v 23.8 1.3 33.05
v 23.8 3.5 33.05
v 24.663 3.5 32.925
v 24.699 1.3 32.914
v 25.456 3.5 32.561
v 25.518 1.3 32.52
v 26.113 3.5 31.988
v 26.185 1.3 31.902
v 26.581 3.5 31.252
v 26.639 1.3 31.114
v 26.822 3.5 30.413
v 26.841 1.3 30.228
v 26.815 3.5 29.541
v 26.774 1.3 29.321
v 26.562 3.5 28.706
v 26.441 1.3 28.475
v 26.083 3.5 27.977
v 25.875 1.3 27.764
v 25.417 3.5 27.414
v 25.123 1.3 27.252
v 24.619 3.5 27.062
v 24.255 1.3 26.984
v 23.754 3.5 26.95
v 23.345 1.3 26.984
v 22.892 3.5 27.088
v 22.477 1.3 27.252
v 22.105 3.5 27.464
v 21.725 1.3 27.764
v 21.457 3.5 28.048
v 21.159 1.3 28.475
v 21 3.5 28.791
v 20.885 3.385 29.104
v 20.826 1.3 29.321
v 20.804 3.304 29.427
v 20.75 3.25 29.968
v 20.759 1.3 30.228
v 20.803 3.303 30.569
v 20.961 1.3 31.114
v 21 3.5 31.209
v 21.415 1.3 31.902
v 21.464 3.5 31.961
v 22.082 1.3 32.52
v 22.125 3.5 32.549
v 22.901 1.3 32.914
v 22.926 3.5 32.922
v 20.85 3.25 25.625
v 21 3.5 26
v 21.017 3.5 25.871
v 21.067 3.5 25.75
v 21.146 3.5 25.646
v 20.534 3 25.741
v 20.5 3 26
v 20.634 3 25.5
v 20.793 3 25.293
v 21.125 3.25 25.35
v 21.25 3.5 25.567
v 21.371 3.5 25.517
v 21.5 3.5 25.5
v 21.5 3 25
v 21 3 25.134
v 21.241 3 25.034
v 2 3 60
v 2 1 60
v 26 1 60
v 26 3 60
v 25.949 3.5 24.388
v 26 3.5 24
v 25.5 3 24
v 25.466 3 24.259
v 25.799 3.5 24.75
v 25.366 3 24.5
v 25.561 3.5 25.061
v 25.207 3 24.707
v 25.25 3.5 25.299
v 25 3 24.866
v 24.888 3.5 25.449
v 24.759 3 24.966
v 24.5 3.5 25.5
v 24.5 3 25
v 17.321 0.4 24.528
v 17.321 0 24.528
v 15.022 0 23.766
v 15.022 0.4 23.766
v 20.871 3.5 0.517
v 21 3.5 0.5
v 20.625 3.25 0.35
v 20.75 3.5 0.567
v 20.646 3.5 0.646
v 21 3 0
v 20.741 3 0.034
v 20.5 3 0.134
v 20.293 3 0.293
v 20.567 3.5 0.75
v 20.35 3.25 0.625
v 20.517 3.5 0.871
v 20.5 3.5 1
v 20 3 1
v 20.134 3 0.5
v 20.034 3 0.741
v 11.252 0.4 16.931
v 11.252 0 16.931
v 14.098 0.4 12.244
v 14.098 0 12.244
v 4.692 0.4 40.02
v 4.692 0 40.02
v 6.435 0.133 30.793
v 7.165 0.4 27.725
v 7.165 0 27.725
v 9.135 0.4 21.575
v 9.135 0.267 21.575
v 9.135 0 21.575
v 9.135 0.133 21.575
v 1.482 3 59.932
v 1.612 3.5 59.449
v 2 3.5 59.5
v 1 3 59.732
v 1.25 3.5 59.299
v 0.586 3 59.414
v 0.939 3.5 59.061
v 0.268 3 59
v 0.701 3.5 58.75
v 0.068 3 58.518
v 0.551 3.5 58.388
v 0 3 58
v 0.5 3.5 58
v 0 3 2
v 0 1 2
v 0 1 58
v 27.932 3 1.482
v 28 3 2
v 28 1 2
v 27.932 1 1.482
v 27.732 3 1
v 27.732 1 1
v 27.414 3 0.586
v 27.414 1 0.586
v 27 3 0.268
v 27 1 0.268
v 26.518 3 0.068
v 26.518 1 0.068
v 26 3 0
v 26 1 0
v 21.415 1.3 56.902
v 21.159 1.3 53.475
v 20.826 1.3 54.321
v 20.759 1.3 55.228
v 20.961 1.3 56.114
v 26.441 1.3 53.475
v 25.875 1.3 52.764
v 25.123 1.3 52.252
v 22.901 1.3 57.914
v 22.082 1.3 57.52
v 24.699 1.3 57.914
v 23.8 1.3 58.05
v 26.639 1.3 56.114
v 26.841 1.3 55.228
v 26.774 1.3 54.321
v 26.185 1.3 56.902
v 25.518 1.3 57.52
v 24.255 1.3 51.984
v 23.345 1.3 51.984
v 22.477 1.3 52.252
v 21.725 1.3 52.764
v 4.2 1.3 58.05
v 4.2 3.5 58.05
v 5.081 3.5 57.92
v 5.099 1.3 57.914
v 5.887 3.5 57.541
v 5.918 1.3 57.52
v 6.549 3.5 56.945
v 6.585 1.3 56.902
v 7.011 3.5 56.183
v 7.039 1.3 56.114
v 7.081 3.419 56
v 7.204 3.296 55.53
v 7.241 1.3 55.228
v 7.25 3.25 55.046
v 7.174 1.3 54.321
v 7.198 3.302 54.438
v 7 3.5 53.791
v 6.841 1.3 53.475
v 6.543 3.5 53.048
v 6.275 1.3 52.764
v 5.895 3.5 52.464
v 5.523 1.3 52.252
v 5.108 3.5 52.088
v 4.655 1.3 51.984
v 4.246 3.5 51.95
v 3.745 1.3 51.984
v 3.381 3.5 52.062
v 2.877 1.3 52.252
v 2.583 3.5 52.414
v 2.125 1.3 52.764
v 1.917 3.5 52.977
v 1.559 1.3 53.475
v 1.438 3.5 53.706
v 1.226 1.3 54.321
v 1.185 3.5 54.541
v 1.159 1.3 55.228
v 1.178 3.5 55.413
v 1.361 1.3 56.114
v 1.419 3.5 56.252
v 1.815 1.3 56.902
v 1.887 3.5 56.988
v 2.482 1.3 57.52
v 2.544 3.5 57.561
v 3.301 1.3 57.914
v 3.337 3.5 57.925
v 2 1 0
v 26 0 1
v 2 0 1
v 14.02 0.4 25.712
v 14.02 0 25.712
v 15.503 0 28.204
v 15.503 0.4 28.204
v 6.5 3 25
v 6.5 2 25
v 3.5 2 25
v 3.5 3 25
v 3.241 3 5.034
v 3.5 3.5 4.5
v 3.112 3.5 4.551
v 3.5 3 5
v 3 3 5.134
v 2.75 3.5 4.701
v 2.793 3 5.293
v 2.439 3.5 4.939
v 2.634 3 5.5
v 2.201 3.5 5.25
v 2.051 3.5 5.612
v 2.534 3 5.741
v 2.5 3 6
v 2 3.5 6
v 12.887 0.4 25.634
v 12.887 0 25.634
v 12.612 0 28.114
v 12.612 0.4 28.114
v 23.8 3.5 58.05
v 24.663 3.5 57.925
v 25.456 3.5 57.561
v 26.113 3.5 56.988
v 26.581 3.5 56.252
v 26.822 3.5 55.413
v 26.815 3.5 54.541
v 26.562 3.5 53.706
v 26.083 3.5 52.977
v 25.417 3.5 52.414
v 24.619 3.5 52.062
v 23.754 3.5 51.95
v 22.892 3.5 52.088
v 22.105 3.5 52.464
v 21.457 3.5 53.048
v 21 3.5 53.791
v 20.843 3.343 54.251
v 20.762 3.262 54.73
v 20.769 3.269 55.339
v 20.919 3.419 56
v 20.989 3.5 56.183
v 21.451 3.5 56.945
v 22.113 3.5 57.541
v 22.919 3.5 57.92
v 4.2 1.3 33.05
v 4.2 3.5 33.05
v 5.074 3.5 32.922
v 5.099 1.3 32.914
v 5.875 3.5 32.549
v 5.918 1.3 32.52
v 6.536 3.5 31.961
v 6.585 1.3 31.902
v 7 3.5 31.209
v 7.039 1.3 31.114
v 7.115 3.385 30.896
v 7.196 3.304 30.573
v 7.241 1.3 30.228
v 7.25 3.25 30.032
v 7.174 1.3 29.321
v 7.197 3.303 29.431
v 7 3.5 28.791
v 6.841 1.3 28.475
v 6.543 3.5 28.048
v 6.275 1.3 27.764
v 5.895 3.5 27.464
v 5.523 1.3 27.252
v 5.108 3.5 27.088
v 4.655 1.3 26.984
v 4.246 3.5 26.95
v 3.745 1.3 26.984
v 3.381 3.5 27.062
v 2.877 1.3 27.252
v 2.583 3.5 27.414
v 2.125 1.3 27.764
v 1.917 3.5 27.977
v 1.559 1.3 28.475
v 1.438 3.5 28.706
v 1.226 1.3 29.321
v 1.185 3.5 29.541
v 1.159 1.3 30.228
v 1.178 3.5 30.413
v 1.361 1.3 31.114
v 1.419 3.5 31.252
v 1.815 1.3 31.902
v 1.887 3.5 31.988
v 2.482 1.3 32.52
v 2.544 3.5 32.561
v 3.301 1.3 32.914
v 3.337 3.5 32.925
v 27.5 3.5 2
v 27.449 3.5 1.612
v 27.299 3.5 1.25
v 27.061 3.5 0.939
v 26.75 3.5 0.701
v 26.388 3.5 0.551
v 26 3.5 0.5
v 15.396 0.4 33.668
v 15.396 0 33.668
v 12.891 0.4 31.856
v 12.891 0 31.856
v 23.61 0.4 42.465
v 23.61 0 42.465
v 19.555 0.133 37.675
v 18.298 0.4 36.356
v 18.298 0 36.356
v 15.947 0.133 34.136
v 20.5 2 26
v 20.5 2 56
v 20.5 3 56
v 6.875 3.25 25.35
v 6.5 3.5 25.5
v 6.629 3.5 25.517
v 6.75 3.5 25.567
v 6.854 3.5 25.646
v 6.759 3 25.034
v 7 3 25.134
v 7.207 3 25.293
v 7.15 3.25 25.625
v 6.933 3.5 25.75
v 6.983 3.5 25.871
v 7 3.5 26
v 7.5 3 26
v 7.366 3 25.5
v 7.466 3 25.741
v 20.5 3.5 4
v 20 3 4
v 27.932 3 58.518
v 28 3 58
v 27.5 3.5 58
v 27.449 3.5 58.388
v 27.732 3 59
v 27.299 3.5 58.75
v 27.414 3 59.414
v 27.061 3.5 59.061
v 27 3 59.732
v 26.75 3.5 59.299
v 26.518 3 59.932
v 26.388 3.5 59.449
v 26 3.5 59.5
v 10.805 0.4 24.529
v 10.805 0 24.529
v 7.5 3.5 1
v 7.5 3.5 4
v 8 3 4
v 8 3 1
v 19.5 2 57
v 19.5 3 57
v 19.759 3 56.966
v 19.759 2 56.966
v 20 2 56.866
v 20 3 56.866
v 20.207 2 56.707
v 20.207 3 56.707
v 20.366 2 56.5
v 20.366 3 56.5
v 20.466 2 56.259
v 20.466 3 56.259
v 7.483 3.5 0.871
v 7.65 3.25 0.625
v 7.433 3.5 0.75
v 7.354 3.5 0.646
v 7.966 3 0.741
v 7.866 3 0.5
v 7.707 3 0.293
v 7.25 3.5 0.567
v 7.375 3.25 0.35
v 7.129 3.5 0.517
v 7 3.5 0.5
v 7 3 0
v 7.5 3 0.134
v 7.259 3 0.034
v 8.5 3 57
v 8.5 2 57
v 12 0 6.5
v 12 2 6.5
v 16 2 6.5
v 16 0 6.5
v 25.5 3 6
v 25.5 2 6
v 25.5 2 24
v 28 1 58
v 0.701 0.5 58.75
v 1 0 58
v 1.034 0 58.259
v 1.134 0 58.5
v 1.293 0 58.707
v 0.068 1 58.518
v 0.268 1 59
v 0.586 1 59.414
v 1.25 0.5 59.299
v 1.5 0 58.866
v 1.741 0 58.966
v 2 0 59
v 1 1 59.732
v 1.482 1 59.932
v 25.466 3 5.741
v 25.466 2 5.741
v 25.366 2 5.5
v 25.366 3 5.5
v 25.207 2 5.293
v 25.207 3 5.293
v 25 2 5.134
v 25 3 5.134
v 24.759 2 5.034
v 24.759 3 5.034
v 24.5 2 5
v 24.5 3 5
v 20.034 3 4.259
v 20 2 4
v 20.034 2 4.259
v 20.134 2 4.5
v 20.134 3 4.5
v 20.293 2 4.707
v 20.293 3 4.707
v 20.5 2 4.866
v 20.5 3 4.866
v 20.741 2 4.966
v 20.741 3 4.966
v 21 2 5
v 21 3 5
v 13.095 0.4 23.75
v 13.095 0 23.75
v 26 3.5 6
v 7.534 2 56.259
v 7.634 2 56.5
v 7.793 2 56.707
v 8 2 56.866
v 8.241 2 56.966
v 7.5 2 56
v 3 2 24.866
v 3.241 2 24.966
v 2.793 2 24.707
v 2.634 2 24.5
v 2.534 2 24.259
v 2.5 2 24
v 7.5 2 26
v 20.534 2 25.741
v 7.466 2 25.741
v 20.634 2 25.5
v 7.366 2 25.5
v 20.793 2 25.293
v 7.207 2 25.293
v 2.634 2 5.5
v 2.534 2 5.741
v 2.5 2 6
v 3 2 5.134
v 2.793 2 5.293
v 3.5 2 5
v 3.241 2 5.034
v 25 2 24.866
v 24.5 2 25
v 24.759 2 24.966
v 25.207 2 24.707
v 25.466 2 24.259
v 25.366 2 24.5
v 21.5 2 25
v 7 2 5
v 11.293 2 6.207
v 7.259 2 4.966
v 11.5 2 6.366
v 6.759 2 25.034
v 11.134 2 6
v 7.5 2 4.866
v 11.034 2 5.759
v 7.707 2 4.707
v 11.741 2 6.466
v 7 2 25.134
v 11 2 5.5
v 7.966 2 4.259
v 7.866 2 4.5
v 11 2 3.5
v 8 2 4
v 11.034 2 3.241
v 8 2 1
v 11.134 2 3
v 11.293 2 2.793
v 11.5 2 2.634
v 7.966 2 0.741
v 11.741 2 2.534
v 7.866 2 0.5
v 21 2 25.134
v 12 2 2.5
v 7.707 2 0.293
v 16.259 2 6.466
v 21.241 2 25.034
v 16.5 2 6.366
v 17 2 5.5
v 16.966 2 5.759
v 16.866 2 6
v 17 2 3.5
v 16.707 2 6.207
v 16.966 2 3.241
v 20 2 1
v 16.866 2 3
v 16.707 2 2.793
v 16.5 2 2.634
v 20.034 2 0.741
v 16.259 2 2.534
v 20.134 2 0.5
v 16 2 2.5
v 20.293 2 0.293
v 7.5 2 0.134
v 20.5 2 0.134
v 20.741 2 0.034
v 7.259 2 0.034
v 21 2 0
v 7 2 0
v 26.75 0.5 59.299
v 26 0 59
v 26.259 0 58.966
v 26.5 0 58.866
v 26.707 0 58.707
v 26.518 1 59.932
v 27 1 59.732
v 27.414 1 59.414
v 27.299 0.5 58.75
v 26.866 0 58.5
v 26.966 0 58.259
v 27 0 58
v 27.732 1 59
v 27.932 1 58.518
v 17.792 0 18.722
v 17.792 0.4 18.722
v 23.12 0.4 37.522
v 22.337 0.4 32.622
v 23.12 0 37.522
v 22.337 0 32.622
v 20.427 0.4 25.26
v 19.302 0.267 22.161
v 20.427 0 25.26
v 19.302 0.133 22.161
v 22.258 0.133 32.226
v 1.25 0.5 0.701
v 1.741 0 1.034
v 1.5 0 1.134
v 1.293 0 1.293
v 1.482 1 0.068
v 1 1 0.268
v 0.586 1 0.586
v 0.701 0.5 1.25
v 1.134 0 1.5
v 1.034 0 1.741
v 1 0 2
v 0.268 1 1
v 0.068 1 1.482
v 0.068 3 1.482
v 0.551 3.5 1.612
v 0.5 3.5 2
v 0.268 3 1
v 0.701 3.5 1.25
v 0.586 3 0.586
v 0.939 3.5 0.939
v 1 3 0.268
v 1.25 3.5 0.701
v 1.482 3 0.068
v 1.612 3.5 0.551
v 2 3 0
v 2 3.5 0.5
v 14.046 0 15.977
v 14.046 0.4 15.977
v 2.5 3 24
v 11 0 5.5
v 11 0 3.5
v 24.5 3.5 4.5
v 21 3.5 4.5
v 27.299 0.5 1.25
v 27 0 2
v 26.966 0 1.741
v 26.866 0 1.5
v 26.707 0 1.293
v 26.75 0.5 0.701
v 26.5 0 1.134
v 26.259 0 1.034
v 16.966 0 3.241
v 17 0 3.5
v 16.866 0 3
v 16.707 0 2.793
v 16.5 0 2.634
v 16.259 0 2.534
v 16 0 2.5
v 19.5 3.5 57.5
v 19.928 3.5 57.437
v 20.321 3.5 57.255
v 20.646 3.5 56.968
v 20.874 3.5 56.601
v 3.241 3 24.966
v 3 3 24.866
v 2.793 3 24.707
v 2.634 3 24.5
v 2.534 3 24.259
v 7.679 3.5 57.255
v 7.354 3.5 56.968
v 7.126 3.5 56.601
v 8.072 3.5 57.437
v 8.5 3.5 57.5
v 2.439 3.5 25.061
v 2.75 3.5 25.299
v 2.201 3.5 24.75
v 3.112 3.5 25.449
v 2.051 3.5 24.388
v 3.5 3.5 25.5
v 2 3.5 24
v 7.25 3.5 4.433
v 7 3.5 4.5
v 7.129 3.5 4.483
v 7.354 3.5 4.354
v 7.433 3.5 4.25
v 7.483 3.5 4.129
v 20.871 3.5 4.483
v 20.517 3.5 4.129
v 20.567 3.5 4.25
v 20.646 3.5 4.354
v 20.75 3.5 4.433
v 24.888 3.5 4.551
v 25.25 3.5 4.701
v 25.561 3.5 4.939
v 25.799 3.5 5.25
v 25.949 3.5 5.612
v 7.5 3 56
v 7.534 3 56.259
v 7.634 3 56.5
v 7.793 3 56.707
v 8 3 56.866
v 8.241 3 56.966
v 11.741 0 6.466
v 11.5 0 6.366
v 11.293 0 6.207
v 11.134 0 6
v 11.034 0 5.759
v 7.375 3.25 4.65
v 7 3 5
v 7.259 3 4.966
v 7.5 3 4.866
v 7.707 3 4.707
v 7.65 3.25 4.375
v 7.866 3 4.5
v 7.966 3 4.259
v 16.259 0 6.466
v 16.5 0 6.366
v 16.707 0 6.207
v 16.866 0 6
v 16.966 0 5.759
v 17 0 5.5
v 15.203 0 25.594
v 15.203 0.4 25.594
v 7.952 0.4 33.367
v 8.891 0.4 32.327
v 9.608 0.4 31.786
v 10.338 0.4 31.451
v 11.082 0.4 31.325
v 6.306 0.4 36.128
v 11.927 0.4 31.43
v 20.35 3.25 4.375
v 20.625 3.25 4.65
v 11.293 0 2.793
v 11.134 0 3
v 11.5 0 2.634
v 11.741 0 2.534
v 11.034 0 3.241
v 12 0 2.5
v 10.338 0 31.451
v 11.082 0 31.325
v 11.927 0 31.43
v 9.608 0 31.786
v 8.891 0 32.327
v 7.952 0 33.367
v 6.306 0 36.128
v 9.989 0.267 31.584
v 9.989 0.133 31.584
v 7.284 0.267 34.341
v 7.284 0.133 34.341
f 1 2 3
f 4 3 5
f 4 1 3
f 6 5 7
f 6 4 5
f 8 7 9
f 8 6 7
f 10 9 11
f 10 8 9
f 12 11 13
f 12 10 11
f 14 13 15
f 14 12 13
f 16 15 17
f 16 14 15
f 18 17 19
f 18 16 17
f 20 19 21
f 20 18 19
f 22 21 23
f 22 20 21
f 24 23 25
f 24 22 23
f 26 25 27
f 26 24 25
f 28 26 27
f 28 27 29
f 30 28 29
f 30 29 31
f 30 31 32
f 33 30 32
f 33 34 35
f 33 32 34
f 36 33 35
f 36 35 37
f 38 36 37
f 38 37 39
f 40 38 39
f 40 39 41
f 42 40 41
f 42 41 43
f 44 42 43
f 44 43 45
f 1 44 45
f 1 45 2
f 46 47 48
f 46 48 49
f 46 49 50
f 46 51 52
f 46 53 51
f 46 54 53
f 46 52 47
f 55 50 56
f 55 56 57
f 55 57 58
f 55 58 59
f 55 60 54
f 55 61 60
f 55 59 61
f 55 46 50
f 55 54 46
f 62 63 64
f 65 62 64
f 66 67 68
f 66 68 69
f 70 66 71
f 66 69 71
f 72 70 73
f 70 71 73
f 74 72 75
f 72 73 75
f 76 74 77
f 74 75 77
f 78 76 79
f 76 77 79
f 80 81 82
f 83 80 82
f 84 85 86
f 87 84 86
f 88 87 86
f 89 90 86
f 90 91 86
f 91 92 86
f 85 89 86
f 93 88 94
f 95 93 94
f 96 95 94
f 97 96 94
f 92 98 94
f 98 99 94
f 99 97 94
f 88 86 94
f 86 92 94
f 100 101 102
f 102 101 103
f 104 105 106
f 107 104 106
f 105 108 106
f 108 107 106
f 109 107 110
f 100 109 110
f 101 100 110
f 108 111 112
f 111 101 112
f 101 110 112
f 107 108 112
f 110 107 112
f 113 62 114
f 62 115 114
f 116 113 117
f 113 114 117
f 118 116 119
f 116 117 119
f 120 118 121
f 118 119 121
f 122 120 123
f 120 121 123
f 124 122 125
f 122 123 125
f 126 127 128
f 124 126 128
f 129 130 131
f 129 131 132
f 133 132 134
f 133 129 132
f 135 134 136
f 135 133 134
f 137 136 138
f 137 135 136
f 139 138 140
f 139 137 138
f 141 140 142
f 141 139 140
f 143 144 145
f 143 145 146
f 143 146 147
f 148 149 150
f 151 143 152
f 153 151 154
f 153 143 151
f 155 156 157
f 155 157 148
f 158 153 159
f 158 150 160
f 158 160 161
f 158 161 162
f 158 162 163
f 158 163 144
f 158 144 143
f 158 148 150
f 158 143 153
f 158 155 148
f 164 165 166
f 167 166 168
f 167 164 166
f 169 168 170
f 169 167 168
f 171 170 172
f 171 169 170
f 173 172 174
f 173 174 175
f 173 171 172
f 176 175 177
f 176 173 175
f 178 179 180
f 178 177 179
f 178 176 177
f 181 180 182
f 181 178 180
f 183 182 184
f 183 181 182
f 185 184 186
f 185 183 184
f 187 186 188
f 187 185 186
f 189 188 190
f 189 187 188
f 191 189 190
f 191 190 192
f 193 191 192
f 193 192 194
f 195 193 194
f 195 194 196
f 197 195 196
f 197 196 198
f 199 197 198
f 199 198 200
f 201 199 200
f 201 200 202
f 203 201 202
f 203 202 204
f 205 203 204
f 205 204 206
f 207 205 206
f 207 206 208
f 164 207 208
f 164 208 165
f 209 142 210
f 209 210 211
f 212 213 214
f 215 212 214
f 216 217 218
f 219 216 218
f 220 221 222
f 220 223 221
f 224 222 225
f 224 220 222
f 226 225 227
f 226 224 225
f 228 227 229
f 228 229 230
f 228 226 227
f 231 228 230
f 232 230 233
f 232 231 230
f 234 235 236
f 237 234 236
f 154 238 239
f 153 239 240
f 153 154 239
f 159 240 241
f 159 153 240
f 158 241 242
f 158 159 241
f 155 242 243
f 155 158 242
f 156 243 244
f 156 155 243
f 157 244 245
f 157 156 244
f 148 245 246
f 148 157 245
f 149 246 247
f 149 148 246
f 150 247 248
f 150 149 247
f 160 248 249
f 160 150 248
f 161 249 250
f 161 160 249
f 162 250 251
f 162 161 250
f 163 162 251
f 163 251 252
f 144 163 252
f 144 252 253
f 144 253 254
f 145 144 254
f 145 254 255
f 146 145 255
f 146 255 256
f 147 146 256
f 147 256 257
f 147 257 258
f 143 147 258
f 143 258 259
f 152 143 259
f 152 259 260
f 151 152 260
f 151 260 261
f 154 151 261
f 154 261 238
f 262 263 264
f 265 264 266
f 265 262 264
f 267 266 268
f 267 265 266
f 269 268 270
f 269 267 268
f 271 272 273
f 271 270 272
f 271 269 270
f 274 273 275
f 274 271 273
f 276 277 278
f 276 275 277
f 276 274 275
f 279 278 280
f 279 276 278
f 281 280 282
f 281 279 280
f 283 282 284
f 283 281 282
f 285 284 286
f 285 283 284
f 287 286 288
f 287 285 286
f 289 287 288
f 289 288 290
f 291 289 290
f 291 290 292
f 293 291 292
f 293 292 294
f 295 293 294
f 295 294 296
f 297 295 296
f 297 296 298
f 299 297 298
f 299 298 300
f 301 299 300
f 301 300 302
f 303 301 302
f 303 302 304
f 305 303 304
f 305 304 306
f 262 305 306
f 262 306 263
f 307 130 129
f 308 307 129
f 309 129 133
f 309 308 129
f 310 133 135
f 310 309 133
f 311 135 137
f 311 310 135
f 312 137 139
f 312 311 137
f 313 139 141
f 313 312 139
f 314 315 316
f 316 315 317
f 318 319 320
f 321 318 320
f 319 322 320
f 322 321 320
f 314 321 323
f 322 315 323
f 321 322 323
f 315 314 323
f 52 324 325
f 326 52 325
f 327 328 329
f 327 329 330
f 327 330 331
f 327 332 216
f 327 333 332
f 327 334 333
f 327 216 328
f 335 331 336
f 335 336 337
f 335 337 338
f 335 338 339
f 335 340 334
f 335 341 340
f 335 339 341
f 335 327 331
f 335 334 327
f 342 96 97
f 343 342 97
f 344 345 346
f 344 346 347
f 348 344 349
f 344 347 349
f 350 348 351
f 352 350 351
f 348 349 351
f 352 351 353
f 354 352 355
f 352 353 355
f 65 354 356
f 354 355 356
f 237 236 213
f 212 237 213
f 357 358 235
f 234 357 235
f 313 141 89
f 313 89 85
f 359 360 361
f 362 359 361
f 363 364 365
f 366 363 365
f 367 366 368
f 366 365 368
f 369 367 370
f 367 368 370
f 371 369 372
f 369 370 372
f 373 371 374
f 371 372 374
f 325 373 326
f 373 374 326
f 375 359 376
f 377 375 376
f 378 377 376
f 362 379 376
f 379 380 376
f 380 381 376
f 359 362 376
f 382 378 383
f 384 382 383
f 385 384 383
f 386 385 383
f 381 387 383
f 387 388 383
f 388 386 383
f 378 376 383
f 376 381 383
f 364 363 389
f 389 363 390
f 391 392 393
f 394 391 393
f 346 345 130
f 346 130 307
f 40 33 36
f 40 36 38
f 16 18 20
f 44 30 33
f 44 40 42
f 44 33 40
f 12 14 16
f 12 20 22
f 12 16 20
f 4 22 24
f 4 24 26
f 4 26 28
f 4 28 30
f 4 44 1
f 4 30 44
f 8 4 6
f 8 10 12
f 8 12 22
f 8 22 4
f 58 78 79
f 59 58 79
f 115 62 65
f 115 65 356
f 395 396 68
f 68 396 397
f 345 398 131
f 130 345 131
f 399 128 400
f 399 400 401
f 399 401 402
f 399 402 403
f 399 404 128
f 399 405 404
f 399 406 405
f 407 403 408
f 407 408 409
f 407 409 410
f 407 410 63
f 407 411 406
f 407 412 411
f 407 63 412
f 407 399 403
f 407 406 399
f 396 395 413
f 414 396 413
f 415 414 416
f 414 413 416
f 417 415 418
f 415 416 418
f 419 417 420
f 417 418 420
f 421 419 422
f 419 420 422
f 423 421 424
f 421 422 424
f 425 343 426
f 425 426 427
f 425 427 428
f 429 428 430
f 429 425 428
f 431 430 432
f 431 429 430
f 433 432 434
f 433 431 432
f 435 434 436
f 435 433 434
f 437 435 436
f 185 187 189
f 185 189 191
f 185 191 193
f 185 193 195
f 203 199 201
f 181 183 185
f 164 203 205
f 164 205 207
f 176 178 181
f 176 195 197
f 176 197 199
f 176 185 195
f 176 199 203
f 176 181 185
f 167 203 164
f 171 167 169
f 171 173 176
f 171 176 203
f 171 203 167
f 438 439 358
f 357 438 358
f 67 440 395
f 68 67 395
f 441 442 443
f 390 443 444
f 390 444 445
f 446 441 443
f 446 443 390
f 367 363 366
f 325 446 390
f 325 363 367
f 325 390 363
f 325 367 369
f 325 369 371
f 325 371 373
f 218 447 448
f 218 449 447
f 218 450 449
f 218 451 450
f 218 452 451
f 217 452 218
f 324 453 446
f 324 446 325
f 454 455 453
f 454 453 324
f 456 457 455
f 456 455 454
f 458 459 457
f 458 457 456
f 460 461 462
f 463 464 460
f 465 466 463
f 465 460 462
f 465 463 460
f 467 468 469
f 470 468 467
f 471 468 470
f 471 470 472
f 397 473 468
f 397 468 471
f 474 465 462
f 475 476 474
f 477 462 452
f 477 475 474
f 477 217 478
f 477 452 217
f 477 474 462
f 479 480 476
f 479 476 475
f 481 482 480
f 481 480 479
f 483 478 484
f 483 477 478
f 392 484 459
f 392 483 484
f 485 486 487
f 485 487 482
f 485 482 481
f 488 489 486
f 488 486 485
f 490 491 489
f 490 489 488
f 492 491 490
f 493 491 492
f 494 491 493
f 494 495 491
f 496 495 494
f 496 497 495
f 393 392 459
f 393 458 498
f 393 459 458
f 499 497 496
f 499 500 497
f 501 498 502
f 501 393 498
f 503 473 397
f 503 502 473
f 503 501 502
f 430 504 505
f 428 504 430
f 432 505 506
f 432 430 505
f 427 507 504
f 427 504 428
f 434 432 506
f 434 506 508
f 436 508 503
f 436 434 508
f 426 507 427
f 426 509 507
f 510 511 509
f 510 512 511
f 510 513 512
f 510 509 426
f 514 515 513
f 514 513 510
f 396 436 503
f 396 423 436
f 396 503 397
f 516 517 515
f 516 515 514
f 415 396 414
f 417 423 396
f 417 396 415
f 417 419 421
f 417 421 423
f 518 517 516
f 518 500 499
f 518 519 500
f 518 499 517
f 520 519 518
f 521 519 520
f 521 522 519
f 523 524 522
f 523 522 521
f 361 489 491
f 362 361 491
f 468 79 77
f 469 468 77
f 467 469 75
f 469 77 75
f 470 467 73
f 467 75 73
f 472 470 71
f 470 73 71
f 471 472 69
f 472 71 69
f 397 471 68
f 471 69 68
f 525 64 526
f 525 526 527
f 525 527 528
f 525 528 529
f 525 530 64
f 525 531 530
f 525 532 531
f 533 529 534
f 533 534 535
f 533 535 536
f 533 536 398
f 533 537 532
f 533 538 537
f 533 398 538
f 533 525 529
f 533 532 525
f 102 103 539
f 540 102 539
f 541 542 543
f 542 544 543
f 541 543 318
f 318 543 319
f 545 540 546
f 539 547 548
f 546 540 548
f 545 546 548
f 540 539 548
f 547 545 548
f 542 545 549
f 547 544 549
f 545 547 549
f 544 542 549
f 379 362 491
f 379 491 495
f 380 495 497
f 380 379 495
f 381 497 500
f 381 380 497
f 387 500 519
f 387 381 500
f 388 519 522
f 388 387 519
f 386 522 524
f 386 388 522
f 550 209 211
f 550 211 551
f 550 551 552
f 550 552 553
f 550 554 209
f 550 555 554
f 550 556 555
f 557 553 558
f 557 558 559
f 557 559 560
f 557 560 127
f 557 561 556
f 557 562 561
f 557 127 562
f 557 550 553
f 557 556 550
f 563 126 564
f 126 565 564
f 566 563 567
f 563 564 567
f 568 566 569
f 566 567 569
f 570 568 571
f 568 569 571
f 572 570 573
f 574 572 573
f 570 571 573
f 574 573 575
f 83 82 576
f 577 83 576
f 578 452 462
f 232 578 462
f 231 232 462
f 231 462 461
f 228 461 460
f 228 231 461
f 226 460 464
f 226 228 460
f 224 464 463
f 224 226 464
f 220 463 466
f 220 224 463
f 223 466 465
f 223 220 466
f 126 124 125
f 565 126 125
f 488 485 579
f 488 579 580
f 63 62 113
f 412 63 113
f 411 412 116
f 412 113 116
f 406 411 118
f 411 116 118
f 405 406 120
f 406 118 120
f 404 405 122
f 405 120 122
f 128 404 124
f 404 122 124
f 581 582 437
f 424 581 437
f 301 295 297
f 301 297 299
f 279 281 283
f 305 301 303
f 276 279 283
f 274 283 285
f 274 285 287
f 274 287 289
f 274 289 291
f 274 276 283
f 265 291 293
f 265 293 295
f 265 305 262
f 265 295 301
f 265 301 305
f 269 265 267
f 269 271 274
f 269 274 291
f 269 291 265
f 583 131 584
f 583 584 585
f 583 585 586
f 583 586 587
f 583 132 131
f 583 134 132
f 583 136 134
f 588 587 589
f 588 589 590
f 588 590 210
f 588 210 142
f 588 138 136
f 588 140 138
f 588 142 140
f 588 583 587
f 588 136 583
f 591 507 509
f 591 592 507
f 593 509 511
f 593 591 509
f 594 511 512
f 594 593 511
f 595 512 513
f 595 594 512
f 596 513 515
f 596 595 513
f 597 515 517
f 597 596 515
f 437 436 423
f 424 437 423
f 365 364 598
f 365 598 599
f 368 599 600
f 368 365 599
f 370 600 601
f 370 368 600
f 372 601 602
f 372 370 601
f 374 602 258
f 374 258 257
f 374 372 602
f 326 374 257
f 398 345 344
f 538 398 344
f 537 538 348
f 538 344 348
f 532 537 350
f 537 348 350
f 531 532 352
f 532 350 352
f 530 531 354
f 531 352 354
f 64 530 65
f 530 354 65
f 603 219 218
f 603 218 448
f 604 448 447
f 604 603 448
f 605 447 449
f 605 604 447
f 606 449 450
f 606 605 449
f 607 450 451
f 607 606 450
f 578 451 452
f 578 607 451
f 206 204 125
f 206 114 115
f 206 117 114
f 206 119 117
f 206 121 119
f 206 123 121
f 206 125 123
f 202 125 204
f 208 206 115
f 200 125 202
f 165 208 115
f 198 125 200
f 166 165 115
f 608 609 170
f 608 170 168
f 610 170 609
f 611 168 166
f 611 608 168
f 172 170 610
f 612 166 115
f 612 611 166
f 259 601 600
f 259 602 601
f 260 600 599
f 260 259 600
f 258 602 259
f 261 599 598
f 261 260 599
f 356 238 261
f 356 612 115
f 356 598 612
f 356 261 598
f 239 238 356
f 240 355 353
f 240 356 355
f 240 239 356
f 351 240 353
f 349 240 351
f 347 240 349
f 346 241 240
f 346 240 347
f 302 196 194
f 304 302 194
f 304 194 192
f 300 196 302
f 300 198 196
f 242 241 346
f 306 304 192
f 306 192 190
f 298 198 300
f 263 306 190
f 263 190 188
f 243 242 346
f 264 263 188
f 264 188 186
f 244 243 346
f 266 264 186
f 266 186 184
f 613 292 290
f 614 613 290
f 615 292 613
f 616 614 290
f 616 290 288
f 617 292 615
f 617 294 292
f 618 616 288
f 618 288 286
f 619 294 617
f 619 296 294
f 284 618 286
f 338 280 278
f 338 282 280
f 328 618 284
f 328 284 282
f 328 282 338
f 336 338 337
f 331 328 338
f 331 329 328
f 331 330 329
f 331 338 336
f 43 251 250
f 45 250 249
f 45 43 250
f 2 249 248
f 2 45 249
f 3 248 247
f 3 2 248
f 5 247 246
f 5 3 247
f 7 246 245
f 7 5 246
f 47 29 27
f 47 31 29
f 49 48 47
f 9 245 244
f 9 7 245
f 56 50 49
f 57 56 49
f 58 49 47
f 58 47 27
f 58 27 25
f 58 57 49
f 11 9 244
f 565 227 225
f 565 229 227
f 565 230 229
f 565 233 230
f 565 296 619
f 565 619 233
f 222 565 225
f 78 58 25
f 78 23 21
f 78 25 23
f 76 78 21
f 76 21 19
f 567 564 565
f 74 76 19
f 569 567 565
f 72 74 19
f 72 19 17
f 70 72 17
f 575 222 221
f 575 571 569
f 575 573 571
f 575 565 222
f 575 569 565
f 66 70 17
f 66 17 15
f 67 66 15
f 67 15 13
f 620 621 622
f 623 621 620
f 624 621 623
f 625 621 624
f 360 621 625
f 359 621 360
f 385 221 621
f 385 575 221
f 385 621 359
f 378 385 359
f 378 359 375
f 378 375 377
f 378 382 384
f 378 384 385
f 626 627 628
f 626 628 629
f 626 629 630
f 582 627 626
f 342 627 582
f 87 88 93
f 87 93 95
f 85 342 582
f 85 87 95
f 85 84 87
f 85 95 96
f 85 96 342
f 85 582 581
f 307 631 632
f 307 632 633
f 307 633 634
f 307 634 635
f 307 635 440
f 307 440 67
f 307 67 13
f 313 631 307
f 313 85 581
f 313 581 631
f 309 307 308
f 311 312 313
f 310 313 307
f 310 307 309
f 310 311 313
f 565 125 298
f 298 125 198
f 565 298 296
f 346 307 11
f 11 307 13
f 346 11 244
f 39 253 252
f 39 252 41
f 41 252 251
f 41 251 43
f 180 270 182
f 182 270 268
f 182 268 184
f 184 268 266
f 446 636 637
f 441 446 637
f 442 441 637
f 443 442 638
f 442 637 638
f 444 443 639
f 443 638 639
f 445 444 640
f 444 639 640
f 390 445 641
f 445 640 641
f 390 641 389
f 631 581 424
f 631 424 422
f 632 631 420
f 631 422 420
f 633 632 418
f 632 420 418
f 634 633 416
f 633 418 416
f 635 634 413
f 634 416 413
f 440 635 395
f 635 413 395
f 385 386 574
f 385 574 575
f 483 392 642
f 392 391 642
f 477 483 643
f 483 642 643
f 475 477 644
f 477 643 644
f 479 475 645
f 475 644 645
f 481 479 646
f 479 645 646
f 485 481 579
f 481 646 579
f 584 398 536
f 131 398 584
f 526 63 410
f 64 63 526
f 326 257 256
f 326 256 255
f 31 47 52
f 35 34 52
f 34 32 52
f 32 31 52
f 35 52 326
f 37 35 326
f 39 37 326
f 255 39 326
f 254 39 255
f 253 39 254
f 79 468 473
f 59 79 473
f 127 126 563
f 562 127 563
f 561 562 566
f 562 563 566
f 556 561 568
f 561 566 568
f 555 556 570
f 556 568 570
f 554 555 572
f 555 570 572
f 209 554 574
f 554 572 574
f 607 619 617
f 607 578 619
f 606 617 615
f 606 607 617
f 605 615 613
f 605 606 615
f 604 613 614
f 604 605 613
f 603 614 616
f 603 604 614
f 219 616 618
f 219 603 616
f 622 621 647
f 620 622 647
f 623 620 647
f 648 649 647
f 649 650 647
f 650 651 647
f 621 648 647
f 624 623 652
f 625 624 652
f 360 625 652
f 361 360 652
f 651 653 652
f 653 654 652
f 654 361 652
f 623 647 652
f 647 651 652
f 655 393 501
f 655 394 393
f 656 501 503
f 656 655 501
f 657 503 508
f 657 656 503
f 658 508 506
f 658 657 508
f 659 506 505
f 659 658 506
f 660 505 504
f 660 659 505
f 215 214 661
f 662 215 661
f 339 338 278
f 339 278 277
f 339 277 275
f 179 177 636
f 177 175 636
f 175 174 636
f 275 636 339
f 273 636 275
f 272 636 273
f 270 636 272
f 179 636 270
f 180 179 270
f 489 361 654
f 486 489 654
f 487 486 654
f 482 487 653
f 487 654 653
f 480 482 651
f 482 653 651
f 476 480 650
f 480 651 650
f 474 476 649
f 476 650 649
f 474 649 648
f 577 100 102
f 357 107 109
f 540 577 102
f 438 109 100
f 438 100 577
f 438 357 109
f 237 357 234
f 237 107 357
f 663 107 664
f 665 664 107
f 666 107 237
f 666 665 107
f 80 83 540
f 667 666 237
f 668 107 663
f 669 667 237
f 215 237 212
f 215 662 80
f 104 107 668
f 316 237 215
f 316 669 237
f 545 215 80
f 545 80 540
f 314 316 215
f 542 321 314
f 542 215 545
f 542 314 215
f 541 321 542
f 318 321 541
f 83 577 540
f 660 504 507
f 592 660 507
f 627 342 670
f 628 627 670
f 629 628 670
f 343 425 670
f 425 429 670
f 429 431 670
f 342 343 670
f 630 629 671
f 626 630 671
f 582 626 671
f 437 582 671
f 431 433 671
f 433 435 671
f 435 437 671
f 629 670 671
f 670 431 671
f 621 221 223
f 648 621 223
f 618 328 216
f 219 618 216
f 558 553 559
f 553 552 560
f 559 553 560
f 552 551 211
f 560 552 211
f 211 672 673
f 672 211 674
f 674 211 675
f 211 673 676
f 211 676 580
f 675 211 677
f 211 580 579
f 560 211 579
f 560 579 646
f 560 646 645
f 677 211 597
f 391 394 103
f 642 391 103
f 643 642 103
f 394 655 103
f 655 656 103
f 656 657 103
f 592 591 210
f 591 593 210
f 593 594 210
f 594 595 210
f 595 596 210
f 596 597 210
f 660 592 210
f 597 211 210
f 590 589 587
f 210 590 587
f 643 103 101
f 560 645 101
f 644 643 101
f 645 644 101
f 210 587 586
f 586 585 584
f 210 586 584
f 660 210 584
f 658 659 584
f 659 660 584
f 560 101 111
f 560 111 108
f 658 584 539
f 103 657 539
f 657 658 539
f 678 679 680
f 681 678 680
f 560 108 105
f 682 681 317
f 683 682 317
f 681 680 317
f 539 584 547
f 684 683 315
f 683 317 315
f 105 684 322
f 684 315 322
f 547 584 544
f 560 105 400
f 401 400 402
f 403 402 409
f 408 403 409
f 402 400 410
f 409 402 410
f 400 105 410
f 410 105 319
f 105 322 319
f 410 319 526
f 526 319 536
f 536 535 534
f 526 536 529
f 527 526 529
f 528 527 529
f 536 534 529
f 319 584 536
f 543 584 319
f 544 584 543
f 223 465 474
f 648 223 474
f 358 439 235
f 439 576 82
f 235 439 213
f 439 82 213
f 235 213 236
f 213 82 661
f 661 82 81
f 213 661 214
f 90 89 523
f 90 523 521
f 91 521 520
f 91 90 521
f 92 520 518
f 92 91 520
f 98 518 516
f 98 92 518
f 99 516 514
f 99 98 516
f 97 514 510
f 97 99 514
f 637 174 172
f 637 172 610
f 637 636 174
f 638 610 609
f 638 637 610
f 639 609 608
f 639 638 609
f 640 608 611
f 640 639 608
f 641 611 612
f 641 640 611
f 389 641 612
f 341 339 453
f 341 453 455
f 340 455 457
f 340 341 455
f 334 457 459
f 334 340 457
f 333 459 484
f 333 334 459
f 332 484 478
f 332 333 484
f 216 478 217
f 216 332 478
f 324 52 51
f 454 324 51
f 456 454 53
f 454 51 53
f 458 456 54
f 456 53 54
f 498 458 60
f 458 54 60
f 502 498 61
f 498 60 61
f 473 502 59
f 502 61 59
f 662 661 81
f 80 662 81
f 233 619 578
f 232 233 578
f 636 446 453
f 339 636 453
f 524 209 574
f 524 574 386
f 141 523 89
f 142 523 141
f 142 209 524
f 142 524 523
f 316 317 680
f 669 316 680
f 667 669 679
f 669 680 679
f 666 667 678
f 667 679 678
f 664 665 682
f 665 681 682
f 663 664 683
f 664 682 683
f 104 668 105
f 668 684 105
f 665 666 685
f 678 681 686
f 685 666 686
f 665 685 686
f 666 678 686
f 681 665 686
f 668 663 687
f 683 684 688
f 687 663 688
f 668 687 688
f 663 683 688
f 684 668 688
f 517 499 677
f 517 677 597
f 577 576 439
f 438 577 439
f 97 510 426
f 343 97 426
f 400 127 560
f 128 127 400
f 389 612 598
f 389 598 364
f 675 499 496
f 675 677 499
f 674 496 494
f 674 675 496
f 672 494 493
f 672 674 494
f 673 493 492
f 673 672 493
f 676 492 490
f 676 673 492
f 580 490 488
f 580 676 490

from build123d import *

# Parameters (mm, degrees)
SKETCH1_R           = 3.05
BOSS_EXTRUDE1_DEPTH = 3.5
SKETCH1_3_W         = 13
SKETCH1_3_H         = 32
SKETCH1_3_W_2       = 12
SKETCH1_3_H_2       = 5
BOSS_EXTRUDE2_DEPTH = 2
SKETCH1_4_R         = 3.05
BOSS_EXTRUDE3_DEPTH = 1.3
SKETCH2_W           = 6
SKETCH2_H           = 4
CUT_EXTRUDE1_DEPTH  = 4
FILLET1_R           = 1
FILLET2_R           = 1
FILLET3_R           = 1
FILLET4_R           = 2
CHAMFER1_SIZE       = 1
CHAMFER2_SIZE       = 0.5
CUT_EXTRUDE2_DEPTH  = 0.4


with BuildPart() as part:
    # Sketch1 → Boss-Extrude1 (new body)
    with BuildSketch(Plane(origin=(0, 0, 0), x_dir=(1, 0, 0), z_dir=(0, 1, 0))):
        Polygon((8, 0), (0, 0), (0, -60), (28, -60), (28, 0), (20, 0), (20, -5), (25.5, -5), (25.5, -25), (20.5, -25), (20.5, -57), (7.5, -57), (7.5, -25), (2.5, -25), (2.5, -5), (8, -5), align=None)
        with Locations(Location((4.2, -55, 0), (0, 0, 270))):
            Circle(SKETCH1_R, mode=Mode.SUBTRACT)
        with Locations(Location((4.2, -30, 0), (0, 0, 270))):
            Circle(SKETCH1_R, mode=Mode.SUBTRACT)
        with Locations(Location((23.8, -55, 0), (0, 0, 270))):
            Circle(SKETCH1_R, mode=Mode.SUBTRACT)
        with Locations(Location((23.8, -30, 0), (0, 0, 270))):
            Circle(SKETCH1_R, mode=Mode.SUBTRACT)
    extrude(amount=BOSS_EXTRUDE1_DEPTH)

    # Sketch1<3> → Boss-Extrude2 (add)
    with BuildSketch(Plane(origin=(0, 0, 0), x_dir=(1, 0, 0), z_dir=(0, 1, 0))):
        with Locations((14, -41)):
            Rectangle(SKETCH1_3_W, SKETCH1_3_H)
        Polygon((20, -5), (8, -5), (2.5, -5), (2.5, -25), (7.5, -25), (20.5, -25), (25.5, -25), (25.5, -5), align=None)
        with Locations((14, -2.5)):
            Rectangle(SKETCH1_3_W_2, SKETCH1_3_H_2)
    extrude(amount=BOSS_EXTRUDE2_DEPTH)

    # Sketch1<4> → Boss-Extrude3 (add)
    with BuildSketch(Plane(origin=(0, 0, 0), x_dir=(1, 0, 0), z_dir=(0, 1, 0))):
        with Locations(Location((4.2, -30, 0), (0, 0, 270))):
            Circle(SKETCH1_4_R)
        with Locations(Location((23.8, -30, 0), (0, 0, 270))):
            Circle(SKETCH1_4_R)
        with Locations(Location((4.2, -55, 0), (0, 0, 270))):
            Circle(SKETCH1_4_R)
        with Locations(Location((23.8, -55, 0), (0, 0, 270))):
            Circle(SKETCH1_4_R)
    extrude(amount=BOSS_EXTRUDE3_DEPTH)

    # Sketch2 → Cut-Extrude1 (cut)
    with BuildSketch(Plane(origin=(0, 2, 0), x_dir=(1, 0, 0), z_dir=(0, 1, 0))):
        with Locations((14, -4.5)):
            Rectangle(SKETCH2_W, SKETCH2_H)
    extrude(amount=-CUT_EXTRUDE1_DEPTH, mode=Mode.SUBTRACT)

    # Fillet1
    fillet1_edges = [part.edges().sort_by_distance(p)[0] for p in [
        (11, 1, 6.5),
        (11, 1, 2.5),
        (17, 1, 2.5),
        (17, 1, 6.5),
    ]]
    fillet(fillet1_edges, radius=FILLET1_R)

    # Fillet2
    fillet2_edges = [part.edges().sort_by_distance(p)[0] for p in [
        (25.5, 2.75, 25),
        (25.5, 2.75, 5),
        (20, 2.75, 5),
        (8, 2.75, 5),
        (2.5, 2.75, 5),
        (2.5, 2.75, 25),
        (7.5, 2.75, 25),
        (7.5, 2.75, 57),
        (20.5, 2.75, 57),
        (20.5, 2.75, 25),
    ]]
    fillet(fillet2_edges, radius=FILLET2_R)

    # Fillet3
    fillet3_edges = [part.edges().sort_by_distance(p)[0] for p in [
        (20, 2.75, 0),
        (8, 2.75, 0),
    ]]
    fillet(fillet3_edges, radius=FILLET3_R)

    # Fillet4
    fillet4_edges = [part.edges().sort_by_distance(p)[0] for p in [
        (28, 1.75, 0),
        (28, 1.75, 60),
        (0, 1.75, 60),
        (0, 1.75, 0),
    ]]
    fillet(fillet4_edges, radius=FILLET4_R)

    # Chamfer1
    chamfer1_edges = [part.edges().sort_by_distance(p)[0] for p in [
        (28, 0, 30),
        (0, 0, 30),
        (14, 0, 0),
        (14, 0, 60),
        (0.585786438, 0, 0.585786438),
        (27.414213562, 0, 0.585786438),
        (0.585786438, 0, 59.414213562),
        (27.414213562, 0, 59.414213562),
    ]]
    chamfer(chamfer1_edges, length=CHAMFER1_SIZE)

    # Chamfer2
    # the kernel refuses this chamfer: 0.5 mm, written as the material it takes off along each edge
    with BuildSketch(Plane(origin=(8.5, 3.5, 56), x_dir=(-1, 0, 0), z_dir=(0, 0, -1))) as chamfer2_piece_1:
        Polygon((1 + CHAMFER2_SIZE, 0), (1, -CHAMFER2_SIZE), (1, 0), align=None)
    revolve(axis=Axis((8.5, 3.5, 56), (0, 1, 0)), revolution_arc=90, mode=Mode.SUBTRACT)
    with BuildSketch(Plane(origin=(7.5, 3.5, 56), x_dir=(-0.9996219169112968, 0.02749587661058651, 0), z_dir=(0, 0, -1)), Plane(origin=(20.5, 3.5, 26), x_dir=(0.9996219169112968, 0.027495876610586414, 0), z_dir=(0, 0, 1))) as chamfer2_piece_2:
        Polygon((CHAMFER2_SIZE * 0.999621916911, -CHAMFER2_SIZE * 0.0274958766106), (-CHAMFER2_SIZE * 0.0274958766106, -CHAMFER2_SIZE * 0.999621916911), (0, 0), align=None)
    extrude(amount=30, mode=Mode.SUBTRACT)
    with BuildSketch(Plane(origin=(19.5, 3.5, 57), x_dir=(0, 0.027495876610586605, 0.9996219169112968), z_dir=(-1, 0, 0))) as chamfer2_piece_3:
        Polygon((CHAMFER2_SIZE * 0.999621916911, -CHAMFER2_SIZE * 0.0274958766106), (-CHAMFER2_SIZE * 0.0274958766106, -CHAMFER2_SIZE * 0.999621916911), (0, 0), align=None)
    extrude(amount=11, mode=Mode.SUBTRACT)
    with BuildSketch(Plane(origin=(6.5, 3.5, 26), x_dir=(0, 0, -1), z_dir=(-1, 0, 0))) as chamfer2_piece_4:
        Polygon((1 - CHAMFER2_SIZE, 0), (1, CHAMFER2_SIZE), (1, 0), align=None)
    revolve(axis=Axis((6.5, 3.5, 26), (0, -1, 0)), revolution_arc=90, mode=Mode.SUBTRACT)
    with BuildSketch(Plane(origin=(19.5, 3.5, 56), x_dir=(0, 0, 1), z_dir=(-1, 0, 0))) as chamfer2_piece_5:
        Polygon((1 + CHAMFER2_SIZE, 0), (1, -CHAMFER2_SIZE), (1, 0), align=None)
    revolve(axis=Axis((19.5, 3.5, 56), (0, 1, 0)), revolution_arc=90, mode=Mode.SUBTRACT)
    with BuildSketch(Plane(origin=(6.5, 3.5, 25), x_dir=(0, 0.027495876610586414, 0.9996219169112968), z_dir=(-1, 0, 0)), Plane(origin=(24.5, 3.5, 25), x_dir=(0, 0.027495876610586414, 0.9996219169112968), z_dir=(-1, 0, 0)), Plane(origin=(8, 3.5, 4), x_dir=(-0.9996219169112968, 0.02749587661058651, 0), z_dir=(0, 0, -1)), Plane(origin=(20, 3.5, 1), x_dir=(0.9996219169112968, 0.027495876610586414, 0), z_dir=(0, 0, 1))) as chamfer2_piece_6:
        Polygon((CHAMFER2_SIZE * 0.999621916911, -CHAMFER2_SIZE * 0.0274958766106), (-CHAMFER2_SIZE * 0.0274958766106, -CHAMFER2_SIZE * 0.999621916911), (0, 0), align=None)
    extrude(amount=3, mode=Mode.SUBTRACT)
    with BuildSketch(Plane(origin=(3.5, 3.5, 24), x_dir=(-1, 0, 0), z_dir=(0, 0, -1))) as chamfer2_piece_7:
        Polygon((1 + CHAMFER2_SIZE, 0), (1, -CHAMFER2_SIZE), (1, 0), align=None)
    revolve(axis=Axis((3.5, 3.5, 24), (0, 1, 0)), revolution_arc=90, mode=Mode.SUBTRACT)
    with BuildSketch(Plane(origin=(21.5, 3.5, 26), x_dir=(-1, 0, 0), z_dir=(0, 0, 1))) as chamfer2_piece_8:
        Polygon((1 - CHAMFER2_SIZE, 0), (1, CHAMFER2_SIZE), (1, 0), align=None)
    revolve(axis=Axis((21.5, 3.5, 26), (0, -1, 0)), revolution_arc=90, mode=Mode.SUBTRACT)
    with BuildSketch(Plane(origin=(2.5, 3.5, 24), x_dir=(-0.9996219169112968, 0.027495876610586438, 0), z_dir=(0, 0, -1)), Plane(origin=(25.5, 3.5, 6), x_dir=(0.9996219169112968, 0.027495876610586414, 0), z_dir=(0, 0, 1))) as chamfer2_piece_9:
        Polygon((CHAMFER2_SIZE * 0.999621916911, -CHAMFER2_SIZE * 0.0274958766106), (-CHAMFER2_SIZE * 0.0274958766106, -CHAMFER2_SIZE * 0.999621916911), (0, 0), align=None)
    extrude(amount=18, mode=Mode.SUBTRACT)
    with BuildSketch(Plane(origin=(3.5, 3.5, 6), x_dir=(0, 0, -1), z_dir=(1, 0, 0))) as chamfer2_piece_10:
        Polygon((1 + CHAMFER2_SIZE, 0), (1, -CHAMFER2_SIZE), (1, 0), align=None)
    revolve(axis=Axis((3.5, 3.5, 6), (0, 1, 0)), revolution_arc=90, mode=Mode.SUBTRACT)
    with BuildSketch(Plane(origin=(24.5, 3.5, 24), x_dir=(1, 0, 0), z_dir=(0, 0, -1))) as chamfer2_piece_11:
        Polygon((1 + CHAMFER2_SIZE, 0), (1, CHAMFER2_SIZE), (1, 0), align=None)
    revolve(axis=Axis((24.5, 3.5, 24), (0, -1, 0)), revolution_arc=90, mode=Mode.SUBTRACT)
    with BuildSketch(Plane(origin=(3.5, 3.5, 5), x_dir=(0, 0.02749587661058651, -0.9996219169112968), z_dir=(1, 0, 0)), Plane(origin=(21, 3.5, 5), x_dir=(0, 0.027495876610586414, -0.9996219169112968), z_dir=(1, 0, 0))) as chamfer2_piece_12:
        Polygon((CHAMFER2_SIZE * 0.999621916911, -CHAMFER2_SIZE * 0.0274958766106), (-CHAMFER2_SIZE * 0.0274958766106, -CHAMFER2_SIZE * 0.999621916911), (0, 0), align=None)
    extrude(amount=3.5, mode=Mode.SUBTRACT)
    with BuildSketch(Plane(origin=(7, 3.5, 4), x_dir=(0, 0, 1), z_dir=(-1, 0, 0))) as chamfer2_piece_13:
        Polygon((1 - CHAMFER2_SIZE, 0), (1, -CHAMFER2_SIZE), (1, 0), align=None)
    revolve(axis=Axis((7, 3.5, 4), (0, 1, 0)), revolution_arc=90, mode=Mode.SUBTRACT)
    with BuildSketch(Plane(origin=(24.5, 3.5, 6), x_dir=(0, 0, -1), z_dir=(-1, 0, 0))) as chamfer2_piece_14:
        Polygon((1 + CHAMFER2_SIZE, 0), (1, CHAMFER2_SIZE), (1, 0), align=None)
    revolve(axis=Axis((24.5, 3.5, 6), (0, -1, 0)), revolution_arc=90, mode=Mode.SUBTRACT)
    with BuildSketch(Plane(origin=(7, 3.5, 1), x_dir=(1, 0, 0), z_dir=(0, 0, 1))) as chamfer2_piece_15:
        Polygon((1 - CHAMFER2_SIZE, 0), (1, -CHAMFER2_SIZE), (1, 0), align=None)
    revolve(axis=Axis((7, 3.5, 1), (0, 1, 0)), revolution_arc=90, mode=Mode.SUBTRACT)
    with BuildSketch(Plane(origin=(21, 3.5, 4), x_dir=(-1, 0, 0), z_dir=(0, 0, -1))) as chamfer2_piece_16:
        Polygon((1 - CHAMFER2_SIZE, 0), (1, -CHAMFER2_SIZE), (1, 0), align=None)
    revolve(axis=Axis((21, 3.5, 4), (0, 1, 0)), revolution_arc=90, mode=Mode.SUBTRACT)
    with BuildSketch(Plane(origin=(7, 3.5, 0), x_dir=(0, -0.9996219169112968, -0.027495876610586365), z_dir=(-1, 0, 0)), Plane(origin=(26, 3.5, 0), x_dir=(0, -0.9996219169112968, -0.027495876610586365), z_dir=(-1, 0, 0))) as chamfer2_piece_17:
        Polygon((CHAMFER2_SIZE * 0.999621916911, CHAMFER2_SIZE * 0.0274958766106), (-CHAMFER2_SIZE * 0.0274958766106, CHAMFER2_SIZE * 0.999621916911), (0, 0), align=None)
    extrude(amount=5, mode=Mode.SUBTRACT)
    with BuildSketch(Plane(origin=(2, 3.5, 2), x_dir=(-1, 0, 0), z_dir=(0, 0, 1))) as chamfer2_piece_18:
        Polygon((2, CHAMFER2_SIZE), (2 - CHAMFER2_SIZE, 0), (2, 0), align=None)
    revolve(axis=Axis((2, 3.5, 2), (0, -1, 0)), revolution_arc=90, mode=Mode.SUBTRACT)
    with BuildSketch(Plane(origin=(21, 3.5, 1), x_dir=(0, 0, -1), z_dir=(1, 0, 0))) as chamfer2_piece_19:
        Polygon((1 - CHAMFER2_SIZE, 0), (1, -CHAMFER2_SIZE), (1, 0), align=None)
    revolve(axis=Axis((21, 3.5, 1), (0, 1, 0)), revolution_arc=90, mode=Mode.SUBTRACT)
    with BuildSketch(Plane(origin=(0, 3.5, 2), x_dir=(-0.02749587661058636, -0.9996219169112968, 0), z_dir=(0, 0, 1)), Plane(origin=(28, 3.5, 58), x_dir=(0.02749587661058907, -0.9996219169112965, 0), z_dir=(0, 0, -1))) as chamfer2_piece_20:
        Polygon((CHAMFER2_SIZE * 0.999621916911, CHAMFER2_SIZE * 0.0274958766106), (-CHAMFER2_SIZE * 0.0274958766106, CHAMFER2_SIZE * 0.999621916911), (0, 0), align=None)
    extrude(amount=56, mode=Mode.SUBTRACT)
    with BuildSketch(Plane(origin=(2, 3.5, 58), x_dir=(0, 0, 1), z_dir=(1, 0, 0))) as chamfer2_piece_21:
        Polygon((2, CHAMFER2_SIZE), (2 - CHAMFER2_SIZE, 0), (2, 0), align=None)
    revolve(axis=Axis((2, 3.5, 58), (0, -1, 0)), revolution_arc=90, mode=Mode.SUBTRACT)
    with BuildSketch(Plane(origin=(26, 3.5, 2), x_dir=(1, 0, 0), z_dir=(0, 0, 1))) as chamfer2_piece_22:
        Polygon((2, -CHAMFER2_SIZE), (2 - CHAMFER2_SIZE, 0), (2, 0), align=None)
    revolve(axis=Axis((26, 3.5, 2), (0, 1, 0)), revolution_arc=90, mode=Mode.SUBTRACT)
    with BuildSketch(Plane(origin=(2, 3.5, 60), x_dir=(0, -0.999621916911297, 0.027495876610582174), z_dir=(1, 0, 0))) as chamfer2_piece_23:
        Polygon((CHAMFER2_SIZE * 0.999621916911, CHAMFER2_SIZE * 0.0274958766106), (-CHAMFER2_SIZE * 0.0274958766106, CHAMFER2_SIZE * 0.999621916911), (0, 0), align=None)
    extrude(amount=24, mode=Mode.SUBTRACT)
    with BuildSketch(Plane(origin=(26, 3.5, 58), x_dir=(1, 0, 0), z_dir=(0, 0, -1))) as chamfer2_piece_24:
        Polygon((2, CHAMFER2_SIZE), (2 - CHAMFER2_SIZE, 0), (2, 0), align=None)
    revolve(axis=Axis((26, 3.5, 58), (0, -1, 0)), revolution_arc=90, mode=Mode.SUBTRACT)

    # Sketch3 → Cut-Extrude2 (cut)
    with BuildSketch(Plane.XZ):
        with BuildLine():
            add(Edge.make_bspline(
                [(14.097910653, 12.243532923), (20.639688273, 22.096806587), (22.846088229, 32.130025027), (23.610210653, 42.464770423)],
                knots=[0, 0, 0, 0, 1, 1, 1, 1], degree=3))
            add(Edge.make_bspline(
                [(23.610210653, 42.464770423), (19.368087057, 37.051812999), (15.634224065, 33.503649915), (12.891410653, 31.855507923)],
                knots=[0, 0, 0, 0, 1, 1, 1, 1], degree=3))
            add(Edge.make_bspline(
                [(12.891410653, 31.855507923), (9.863152041, 30.035843795), (7.255065309, 32.914045303), (4.691973153, 40.020020423)],
                knots=[0, 0, 0, 0, 1, 1, 1, 1], degree=3))
            add(Edge.make_bspline(
                [(4.691973153, 40.020020423), (6.392651997, 30.746919843), (7.568627293, 21.672393415), (14.097910653, 12.243532923)],
                knots=[0, 0, 0, 0, 1, 1, 1, 1], degree=3))
        make_face()
        Polygon((14.045523153, 15.977332923), (13.094610653, 23.749732923), (10.805435653, 24.529195423), (12.886648153, 25.634095423), (12.612010653, 28.113770423), (14.020123153, 25.711882923), (15.502848153, 28.204257923), (15.202810653, 25.594407923), (17.320535653, 24.527607923), (15.021835653, 23.765607923), align=None, mode=Mode.SUBTRACT)
    extrude(amount=-CUT_EXTRUDE2_DEPTH, mode=Mode.SUBTRACT)


solid = part.part
